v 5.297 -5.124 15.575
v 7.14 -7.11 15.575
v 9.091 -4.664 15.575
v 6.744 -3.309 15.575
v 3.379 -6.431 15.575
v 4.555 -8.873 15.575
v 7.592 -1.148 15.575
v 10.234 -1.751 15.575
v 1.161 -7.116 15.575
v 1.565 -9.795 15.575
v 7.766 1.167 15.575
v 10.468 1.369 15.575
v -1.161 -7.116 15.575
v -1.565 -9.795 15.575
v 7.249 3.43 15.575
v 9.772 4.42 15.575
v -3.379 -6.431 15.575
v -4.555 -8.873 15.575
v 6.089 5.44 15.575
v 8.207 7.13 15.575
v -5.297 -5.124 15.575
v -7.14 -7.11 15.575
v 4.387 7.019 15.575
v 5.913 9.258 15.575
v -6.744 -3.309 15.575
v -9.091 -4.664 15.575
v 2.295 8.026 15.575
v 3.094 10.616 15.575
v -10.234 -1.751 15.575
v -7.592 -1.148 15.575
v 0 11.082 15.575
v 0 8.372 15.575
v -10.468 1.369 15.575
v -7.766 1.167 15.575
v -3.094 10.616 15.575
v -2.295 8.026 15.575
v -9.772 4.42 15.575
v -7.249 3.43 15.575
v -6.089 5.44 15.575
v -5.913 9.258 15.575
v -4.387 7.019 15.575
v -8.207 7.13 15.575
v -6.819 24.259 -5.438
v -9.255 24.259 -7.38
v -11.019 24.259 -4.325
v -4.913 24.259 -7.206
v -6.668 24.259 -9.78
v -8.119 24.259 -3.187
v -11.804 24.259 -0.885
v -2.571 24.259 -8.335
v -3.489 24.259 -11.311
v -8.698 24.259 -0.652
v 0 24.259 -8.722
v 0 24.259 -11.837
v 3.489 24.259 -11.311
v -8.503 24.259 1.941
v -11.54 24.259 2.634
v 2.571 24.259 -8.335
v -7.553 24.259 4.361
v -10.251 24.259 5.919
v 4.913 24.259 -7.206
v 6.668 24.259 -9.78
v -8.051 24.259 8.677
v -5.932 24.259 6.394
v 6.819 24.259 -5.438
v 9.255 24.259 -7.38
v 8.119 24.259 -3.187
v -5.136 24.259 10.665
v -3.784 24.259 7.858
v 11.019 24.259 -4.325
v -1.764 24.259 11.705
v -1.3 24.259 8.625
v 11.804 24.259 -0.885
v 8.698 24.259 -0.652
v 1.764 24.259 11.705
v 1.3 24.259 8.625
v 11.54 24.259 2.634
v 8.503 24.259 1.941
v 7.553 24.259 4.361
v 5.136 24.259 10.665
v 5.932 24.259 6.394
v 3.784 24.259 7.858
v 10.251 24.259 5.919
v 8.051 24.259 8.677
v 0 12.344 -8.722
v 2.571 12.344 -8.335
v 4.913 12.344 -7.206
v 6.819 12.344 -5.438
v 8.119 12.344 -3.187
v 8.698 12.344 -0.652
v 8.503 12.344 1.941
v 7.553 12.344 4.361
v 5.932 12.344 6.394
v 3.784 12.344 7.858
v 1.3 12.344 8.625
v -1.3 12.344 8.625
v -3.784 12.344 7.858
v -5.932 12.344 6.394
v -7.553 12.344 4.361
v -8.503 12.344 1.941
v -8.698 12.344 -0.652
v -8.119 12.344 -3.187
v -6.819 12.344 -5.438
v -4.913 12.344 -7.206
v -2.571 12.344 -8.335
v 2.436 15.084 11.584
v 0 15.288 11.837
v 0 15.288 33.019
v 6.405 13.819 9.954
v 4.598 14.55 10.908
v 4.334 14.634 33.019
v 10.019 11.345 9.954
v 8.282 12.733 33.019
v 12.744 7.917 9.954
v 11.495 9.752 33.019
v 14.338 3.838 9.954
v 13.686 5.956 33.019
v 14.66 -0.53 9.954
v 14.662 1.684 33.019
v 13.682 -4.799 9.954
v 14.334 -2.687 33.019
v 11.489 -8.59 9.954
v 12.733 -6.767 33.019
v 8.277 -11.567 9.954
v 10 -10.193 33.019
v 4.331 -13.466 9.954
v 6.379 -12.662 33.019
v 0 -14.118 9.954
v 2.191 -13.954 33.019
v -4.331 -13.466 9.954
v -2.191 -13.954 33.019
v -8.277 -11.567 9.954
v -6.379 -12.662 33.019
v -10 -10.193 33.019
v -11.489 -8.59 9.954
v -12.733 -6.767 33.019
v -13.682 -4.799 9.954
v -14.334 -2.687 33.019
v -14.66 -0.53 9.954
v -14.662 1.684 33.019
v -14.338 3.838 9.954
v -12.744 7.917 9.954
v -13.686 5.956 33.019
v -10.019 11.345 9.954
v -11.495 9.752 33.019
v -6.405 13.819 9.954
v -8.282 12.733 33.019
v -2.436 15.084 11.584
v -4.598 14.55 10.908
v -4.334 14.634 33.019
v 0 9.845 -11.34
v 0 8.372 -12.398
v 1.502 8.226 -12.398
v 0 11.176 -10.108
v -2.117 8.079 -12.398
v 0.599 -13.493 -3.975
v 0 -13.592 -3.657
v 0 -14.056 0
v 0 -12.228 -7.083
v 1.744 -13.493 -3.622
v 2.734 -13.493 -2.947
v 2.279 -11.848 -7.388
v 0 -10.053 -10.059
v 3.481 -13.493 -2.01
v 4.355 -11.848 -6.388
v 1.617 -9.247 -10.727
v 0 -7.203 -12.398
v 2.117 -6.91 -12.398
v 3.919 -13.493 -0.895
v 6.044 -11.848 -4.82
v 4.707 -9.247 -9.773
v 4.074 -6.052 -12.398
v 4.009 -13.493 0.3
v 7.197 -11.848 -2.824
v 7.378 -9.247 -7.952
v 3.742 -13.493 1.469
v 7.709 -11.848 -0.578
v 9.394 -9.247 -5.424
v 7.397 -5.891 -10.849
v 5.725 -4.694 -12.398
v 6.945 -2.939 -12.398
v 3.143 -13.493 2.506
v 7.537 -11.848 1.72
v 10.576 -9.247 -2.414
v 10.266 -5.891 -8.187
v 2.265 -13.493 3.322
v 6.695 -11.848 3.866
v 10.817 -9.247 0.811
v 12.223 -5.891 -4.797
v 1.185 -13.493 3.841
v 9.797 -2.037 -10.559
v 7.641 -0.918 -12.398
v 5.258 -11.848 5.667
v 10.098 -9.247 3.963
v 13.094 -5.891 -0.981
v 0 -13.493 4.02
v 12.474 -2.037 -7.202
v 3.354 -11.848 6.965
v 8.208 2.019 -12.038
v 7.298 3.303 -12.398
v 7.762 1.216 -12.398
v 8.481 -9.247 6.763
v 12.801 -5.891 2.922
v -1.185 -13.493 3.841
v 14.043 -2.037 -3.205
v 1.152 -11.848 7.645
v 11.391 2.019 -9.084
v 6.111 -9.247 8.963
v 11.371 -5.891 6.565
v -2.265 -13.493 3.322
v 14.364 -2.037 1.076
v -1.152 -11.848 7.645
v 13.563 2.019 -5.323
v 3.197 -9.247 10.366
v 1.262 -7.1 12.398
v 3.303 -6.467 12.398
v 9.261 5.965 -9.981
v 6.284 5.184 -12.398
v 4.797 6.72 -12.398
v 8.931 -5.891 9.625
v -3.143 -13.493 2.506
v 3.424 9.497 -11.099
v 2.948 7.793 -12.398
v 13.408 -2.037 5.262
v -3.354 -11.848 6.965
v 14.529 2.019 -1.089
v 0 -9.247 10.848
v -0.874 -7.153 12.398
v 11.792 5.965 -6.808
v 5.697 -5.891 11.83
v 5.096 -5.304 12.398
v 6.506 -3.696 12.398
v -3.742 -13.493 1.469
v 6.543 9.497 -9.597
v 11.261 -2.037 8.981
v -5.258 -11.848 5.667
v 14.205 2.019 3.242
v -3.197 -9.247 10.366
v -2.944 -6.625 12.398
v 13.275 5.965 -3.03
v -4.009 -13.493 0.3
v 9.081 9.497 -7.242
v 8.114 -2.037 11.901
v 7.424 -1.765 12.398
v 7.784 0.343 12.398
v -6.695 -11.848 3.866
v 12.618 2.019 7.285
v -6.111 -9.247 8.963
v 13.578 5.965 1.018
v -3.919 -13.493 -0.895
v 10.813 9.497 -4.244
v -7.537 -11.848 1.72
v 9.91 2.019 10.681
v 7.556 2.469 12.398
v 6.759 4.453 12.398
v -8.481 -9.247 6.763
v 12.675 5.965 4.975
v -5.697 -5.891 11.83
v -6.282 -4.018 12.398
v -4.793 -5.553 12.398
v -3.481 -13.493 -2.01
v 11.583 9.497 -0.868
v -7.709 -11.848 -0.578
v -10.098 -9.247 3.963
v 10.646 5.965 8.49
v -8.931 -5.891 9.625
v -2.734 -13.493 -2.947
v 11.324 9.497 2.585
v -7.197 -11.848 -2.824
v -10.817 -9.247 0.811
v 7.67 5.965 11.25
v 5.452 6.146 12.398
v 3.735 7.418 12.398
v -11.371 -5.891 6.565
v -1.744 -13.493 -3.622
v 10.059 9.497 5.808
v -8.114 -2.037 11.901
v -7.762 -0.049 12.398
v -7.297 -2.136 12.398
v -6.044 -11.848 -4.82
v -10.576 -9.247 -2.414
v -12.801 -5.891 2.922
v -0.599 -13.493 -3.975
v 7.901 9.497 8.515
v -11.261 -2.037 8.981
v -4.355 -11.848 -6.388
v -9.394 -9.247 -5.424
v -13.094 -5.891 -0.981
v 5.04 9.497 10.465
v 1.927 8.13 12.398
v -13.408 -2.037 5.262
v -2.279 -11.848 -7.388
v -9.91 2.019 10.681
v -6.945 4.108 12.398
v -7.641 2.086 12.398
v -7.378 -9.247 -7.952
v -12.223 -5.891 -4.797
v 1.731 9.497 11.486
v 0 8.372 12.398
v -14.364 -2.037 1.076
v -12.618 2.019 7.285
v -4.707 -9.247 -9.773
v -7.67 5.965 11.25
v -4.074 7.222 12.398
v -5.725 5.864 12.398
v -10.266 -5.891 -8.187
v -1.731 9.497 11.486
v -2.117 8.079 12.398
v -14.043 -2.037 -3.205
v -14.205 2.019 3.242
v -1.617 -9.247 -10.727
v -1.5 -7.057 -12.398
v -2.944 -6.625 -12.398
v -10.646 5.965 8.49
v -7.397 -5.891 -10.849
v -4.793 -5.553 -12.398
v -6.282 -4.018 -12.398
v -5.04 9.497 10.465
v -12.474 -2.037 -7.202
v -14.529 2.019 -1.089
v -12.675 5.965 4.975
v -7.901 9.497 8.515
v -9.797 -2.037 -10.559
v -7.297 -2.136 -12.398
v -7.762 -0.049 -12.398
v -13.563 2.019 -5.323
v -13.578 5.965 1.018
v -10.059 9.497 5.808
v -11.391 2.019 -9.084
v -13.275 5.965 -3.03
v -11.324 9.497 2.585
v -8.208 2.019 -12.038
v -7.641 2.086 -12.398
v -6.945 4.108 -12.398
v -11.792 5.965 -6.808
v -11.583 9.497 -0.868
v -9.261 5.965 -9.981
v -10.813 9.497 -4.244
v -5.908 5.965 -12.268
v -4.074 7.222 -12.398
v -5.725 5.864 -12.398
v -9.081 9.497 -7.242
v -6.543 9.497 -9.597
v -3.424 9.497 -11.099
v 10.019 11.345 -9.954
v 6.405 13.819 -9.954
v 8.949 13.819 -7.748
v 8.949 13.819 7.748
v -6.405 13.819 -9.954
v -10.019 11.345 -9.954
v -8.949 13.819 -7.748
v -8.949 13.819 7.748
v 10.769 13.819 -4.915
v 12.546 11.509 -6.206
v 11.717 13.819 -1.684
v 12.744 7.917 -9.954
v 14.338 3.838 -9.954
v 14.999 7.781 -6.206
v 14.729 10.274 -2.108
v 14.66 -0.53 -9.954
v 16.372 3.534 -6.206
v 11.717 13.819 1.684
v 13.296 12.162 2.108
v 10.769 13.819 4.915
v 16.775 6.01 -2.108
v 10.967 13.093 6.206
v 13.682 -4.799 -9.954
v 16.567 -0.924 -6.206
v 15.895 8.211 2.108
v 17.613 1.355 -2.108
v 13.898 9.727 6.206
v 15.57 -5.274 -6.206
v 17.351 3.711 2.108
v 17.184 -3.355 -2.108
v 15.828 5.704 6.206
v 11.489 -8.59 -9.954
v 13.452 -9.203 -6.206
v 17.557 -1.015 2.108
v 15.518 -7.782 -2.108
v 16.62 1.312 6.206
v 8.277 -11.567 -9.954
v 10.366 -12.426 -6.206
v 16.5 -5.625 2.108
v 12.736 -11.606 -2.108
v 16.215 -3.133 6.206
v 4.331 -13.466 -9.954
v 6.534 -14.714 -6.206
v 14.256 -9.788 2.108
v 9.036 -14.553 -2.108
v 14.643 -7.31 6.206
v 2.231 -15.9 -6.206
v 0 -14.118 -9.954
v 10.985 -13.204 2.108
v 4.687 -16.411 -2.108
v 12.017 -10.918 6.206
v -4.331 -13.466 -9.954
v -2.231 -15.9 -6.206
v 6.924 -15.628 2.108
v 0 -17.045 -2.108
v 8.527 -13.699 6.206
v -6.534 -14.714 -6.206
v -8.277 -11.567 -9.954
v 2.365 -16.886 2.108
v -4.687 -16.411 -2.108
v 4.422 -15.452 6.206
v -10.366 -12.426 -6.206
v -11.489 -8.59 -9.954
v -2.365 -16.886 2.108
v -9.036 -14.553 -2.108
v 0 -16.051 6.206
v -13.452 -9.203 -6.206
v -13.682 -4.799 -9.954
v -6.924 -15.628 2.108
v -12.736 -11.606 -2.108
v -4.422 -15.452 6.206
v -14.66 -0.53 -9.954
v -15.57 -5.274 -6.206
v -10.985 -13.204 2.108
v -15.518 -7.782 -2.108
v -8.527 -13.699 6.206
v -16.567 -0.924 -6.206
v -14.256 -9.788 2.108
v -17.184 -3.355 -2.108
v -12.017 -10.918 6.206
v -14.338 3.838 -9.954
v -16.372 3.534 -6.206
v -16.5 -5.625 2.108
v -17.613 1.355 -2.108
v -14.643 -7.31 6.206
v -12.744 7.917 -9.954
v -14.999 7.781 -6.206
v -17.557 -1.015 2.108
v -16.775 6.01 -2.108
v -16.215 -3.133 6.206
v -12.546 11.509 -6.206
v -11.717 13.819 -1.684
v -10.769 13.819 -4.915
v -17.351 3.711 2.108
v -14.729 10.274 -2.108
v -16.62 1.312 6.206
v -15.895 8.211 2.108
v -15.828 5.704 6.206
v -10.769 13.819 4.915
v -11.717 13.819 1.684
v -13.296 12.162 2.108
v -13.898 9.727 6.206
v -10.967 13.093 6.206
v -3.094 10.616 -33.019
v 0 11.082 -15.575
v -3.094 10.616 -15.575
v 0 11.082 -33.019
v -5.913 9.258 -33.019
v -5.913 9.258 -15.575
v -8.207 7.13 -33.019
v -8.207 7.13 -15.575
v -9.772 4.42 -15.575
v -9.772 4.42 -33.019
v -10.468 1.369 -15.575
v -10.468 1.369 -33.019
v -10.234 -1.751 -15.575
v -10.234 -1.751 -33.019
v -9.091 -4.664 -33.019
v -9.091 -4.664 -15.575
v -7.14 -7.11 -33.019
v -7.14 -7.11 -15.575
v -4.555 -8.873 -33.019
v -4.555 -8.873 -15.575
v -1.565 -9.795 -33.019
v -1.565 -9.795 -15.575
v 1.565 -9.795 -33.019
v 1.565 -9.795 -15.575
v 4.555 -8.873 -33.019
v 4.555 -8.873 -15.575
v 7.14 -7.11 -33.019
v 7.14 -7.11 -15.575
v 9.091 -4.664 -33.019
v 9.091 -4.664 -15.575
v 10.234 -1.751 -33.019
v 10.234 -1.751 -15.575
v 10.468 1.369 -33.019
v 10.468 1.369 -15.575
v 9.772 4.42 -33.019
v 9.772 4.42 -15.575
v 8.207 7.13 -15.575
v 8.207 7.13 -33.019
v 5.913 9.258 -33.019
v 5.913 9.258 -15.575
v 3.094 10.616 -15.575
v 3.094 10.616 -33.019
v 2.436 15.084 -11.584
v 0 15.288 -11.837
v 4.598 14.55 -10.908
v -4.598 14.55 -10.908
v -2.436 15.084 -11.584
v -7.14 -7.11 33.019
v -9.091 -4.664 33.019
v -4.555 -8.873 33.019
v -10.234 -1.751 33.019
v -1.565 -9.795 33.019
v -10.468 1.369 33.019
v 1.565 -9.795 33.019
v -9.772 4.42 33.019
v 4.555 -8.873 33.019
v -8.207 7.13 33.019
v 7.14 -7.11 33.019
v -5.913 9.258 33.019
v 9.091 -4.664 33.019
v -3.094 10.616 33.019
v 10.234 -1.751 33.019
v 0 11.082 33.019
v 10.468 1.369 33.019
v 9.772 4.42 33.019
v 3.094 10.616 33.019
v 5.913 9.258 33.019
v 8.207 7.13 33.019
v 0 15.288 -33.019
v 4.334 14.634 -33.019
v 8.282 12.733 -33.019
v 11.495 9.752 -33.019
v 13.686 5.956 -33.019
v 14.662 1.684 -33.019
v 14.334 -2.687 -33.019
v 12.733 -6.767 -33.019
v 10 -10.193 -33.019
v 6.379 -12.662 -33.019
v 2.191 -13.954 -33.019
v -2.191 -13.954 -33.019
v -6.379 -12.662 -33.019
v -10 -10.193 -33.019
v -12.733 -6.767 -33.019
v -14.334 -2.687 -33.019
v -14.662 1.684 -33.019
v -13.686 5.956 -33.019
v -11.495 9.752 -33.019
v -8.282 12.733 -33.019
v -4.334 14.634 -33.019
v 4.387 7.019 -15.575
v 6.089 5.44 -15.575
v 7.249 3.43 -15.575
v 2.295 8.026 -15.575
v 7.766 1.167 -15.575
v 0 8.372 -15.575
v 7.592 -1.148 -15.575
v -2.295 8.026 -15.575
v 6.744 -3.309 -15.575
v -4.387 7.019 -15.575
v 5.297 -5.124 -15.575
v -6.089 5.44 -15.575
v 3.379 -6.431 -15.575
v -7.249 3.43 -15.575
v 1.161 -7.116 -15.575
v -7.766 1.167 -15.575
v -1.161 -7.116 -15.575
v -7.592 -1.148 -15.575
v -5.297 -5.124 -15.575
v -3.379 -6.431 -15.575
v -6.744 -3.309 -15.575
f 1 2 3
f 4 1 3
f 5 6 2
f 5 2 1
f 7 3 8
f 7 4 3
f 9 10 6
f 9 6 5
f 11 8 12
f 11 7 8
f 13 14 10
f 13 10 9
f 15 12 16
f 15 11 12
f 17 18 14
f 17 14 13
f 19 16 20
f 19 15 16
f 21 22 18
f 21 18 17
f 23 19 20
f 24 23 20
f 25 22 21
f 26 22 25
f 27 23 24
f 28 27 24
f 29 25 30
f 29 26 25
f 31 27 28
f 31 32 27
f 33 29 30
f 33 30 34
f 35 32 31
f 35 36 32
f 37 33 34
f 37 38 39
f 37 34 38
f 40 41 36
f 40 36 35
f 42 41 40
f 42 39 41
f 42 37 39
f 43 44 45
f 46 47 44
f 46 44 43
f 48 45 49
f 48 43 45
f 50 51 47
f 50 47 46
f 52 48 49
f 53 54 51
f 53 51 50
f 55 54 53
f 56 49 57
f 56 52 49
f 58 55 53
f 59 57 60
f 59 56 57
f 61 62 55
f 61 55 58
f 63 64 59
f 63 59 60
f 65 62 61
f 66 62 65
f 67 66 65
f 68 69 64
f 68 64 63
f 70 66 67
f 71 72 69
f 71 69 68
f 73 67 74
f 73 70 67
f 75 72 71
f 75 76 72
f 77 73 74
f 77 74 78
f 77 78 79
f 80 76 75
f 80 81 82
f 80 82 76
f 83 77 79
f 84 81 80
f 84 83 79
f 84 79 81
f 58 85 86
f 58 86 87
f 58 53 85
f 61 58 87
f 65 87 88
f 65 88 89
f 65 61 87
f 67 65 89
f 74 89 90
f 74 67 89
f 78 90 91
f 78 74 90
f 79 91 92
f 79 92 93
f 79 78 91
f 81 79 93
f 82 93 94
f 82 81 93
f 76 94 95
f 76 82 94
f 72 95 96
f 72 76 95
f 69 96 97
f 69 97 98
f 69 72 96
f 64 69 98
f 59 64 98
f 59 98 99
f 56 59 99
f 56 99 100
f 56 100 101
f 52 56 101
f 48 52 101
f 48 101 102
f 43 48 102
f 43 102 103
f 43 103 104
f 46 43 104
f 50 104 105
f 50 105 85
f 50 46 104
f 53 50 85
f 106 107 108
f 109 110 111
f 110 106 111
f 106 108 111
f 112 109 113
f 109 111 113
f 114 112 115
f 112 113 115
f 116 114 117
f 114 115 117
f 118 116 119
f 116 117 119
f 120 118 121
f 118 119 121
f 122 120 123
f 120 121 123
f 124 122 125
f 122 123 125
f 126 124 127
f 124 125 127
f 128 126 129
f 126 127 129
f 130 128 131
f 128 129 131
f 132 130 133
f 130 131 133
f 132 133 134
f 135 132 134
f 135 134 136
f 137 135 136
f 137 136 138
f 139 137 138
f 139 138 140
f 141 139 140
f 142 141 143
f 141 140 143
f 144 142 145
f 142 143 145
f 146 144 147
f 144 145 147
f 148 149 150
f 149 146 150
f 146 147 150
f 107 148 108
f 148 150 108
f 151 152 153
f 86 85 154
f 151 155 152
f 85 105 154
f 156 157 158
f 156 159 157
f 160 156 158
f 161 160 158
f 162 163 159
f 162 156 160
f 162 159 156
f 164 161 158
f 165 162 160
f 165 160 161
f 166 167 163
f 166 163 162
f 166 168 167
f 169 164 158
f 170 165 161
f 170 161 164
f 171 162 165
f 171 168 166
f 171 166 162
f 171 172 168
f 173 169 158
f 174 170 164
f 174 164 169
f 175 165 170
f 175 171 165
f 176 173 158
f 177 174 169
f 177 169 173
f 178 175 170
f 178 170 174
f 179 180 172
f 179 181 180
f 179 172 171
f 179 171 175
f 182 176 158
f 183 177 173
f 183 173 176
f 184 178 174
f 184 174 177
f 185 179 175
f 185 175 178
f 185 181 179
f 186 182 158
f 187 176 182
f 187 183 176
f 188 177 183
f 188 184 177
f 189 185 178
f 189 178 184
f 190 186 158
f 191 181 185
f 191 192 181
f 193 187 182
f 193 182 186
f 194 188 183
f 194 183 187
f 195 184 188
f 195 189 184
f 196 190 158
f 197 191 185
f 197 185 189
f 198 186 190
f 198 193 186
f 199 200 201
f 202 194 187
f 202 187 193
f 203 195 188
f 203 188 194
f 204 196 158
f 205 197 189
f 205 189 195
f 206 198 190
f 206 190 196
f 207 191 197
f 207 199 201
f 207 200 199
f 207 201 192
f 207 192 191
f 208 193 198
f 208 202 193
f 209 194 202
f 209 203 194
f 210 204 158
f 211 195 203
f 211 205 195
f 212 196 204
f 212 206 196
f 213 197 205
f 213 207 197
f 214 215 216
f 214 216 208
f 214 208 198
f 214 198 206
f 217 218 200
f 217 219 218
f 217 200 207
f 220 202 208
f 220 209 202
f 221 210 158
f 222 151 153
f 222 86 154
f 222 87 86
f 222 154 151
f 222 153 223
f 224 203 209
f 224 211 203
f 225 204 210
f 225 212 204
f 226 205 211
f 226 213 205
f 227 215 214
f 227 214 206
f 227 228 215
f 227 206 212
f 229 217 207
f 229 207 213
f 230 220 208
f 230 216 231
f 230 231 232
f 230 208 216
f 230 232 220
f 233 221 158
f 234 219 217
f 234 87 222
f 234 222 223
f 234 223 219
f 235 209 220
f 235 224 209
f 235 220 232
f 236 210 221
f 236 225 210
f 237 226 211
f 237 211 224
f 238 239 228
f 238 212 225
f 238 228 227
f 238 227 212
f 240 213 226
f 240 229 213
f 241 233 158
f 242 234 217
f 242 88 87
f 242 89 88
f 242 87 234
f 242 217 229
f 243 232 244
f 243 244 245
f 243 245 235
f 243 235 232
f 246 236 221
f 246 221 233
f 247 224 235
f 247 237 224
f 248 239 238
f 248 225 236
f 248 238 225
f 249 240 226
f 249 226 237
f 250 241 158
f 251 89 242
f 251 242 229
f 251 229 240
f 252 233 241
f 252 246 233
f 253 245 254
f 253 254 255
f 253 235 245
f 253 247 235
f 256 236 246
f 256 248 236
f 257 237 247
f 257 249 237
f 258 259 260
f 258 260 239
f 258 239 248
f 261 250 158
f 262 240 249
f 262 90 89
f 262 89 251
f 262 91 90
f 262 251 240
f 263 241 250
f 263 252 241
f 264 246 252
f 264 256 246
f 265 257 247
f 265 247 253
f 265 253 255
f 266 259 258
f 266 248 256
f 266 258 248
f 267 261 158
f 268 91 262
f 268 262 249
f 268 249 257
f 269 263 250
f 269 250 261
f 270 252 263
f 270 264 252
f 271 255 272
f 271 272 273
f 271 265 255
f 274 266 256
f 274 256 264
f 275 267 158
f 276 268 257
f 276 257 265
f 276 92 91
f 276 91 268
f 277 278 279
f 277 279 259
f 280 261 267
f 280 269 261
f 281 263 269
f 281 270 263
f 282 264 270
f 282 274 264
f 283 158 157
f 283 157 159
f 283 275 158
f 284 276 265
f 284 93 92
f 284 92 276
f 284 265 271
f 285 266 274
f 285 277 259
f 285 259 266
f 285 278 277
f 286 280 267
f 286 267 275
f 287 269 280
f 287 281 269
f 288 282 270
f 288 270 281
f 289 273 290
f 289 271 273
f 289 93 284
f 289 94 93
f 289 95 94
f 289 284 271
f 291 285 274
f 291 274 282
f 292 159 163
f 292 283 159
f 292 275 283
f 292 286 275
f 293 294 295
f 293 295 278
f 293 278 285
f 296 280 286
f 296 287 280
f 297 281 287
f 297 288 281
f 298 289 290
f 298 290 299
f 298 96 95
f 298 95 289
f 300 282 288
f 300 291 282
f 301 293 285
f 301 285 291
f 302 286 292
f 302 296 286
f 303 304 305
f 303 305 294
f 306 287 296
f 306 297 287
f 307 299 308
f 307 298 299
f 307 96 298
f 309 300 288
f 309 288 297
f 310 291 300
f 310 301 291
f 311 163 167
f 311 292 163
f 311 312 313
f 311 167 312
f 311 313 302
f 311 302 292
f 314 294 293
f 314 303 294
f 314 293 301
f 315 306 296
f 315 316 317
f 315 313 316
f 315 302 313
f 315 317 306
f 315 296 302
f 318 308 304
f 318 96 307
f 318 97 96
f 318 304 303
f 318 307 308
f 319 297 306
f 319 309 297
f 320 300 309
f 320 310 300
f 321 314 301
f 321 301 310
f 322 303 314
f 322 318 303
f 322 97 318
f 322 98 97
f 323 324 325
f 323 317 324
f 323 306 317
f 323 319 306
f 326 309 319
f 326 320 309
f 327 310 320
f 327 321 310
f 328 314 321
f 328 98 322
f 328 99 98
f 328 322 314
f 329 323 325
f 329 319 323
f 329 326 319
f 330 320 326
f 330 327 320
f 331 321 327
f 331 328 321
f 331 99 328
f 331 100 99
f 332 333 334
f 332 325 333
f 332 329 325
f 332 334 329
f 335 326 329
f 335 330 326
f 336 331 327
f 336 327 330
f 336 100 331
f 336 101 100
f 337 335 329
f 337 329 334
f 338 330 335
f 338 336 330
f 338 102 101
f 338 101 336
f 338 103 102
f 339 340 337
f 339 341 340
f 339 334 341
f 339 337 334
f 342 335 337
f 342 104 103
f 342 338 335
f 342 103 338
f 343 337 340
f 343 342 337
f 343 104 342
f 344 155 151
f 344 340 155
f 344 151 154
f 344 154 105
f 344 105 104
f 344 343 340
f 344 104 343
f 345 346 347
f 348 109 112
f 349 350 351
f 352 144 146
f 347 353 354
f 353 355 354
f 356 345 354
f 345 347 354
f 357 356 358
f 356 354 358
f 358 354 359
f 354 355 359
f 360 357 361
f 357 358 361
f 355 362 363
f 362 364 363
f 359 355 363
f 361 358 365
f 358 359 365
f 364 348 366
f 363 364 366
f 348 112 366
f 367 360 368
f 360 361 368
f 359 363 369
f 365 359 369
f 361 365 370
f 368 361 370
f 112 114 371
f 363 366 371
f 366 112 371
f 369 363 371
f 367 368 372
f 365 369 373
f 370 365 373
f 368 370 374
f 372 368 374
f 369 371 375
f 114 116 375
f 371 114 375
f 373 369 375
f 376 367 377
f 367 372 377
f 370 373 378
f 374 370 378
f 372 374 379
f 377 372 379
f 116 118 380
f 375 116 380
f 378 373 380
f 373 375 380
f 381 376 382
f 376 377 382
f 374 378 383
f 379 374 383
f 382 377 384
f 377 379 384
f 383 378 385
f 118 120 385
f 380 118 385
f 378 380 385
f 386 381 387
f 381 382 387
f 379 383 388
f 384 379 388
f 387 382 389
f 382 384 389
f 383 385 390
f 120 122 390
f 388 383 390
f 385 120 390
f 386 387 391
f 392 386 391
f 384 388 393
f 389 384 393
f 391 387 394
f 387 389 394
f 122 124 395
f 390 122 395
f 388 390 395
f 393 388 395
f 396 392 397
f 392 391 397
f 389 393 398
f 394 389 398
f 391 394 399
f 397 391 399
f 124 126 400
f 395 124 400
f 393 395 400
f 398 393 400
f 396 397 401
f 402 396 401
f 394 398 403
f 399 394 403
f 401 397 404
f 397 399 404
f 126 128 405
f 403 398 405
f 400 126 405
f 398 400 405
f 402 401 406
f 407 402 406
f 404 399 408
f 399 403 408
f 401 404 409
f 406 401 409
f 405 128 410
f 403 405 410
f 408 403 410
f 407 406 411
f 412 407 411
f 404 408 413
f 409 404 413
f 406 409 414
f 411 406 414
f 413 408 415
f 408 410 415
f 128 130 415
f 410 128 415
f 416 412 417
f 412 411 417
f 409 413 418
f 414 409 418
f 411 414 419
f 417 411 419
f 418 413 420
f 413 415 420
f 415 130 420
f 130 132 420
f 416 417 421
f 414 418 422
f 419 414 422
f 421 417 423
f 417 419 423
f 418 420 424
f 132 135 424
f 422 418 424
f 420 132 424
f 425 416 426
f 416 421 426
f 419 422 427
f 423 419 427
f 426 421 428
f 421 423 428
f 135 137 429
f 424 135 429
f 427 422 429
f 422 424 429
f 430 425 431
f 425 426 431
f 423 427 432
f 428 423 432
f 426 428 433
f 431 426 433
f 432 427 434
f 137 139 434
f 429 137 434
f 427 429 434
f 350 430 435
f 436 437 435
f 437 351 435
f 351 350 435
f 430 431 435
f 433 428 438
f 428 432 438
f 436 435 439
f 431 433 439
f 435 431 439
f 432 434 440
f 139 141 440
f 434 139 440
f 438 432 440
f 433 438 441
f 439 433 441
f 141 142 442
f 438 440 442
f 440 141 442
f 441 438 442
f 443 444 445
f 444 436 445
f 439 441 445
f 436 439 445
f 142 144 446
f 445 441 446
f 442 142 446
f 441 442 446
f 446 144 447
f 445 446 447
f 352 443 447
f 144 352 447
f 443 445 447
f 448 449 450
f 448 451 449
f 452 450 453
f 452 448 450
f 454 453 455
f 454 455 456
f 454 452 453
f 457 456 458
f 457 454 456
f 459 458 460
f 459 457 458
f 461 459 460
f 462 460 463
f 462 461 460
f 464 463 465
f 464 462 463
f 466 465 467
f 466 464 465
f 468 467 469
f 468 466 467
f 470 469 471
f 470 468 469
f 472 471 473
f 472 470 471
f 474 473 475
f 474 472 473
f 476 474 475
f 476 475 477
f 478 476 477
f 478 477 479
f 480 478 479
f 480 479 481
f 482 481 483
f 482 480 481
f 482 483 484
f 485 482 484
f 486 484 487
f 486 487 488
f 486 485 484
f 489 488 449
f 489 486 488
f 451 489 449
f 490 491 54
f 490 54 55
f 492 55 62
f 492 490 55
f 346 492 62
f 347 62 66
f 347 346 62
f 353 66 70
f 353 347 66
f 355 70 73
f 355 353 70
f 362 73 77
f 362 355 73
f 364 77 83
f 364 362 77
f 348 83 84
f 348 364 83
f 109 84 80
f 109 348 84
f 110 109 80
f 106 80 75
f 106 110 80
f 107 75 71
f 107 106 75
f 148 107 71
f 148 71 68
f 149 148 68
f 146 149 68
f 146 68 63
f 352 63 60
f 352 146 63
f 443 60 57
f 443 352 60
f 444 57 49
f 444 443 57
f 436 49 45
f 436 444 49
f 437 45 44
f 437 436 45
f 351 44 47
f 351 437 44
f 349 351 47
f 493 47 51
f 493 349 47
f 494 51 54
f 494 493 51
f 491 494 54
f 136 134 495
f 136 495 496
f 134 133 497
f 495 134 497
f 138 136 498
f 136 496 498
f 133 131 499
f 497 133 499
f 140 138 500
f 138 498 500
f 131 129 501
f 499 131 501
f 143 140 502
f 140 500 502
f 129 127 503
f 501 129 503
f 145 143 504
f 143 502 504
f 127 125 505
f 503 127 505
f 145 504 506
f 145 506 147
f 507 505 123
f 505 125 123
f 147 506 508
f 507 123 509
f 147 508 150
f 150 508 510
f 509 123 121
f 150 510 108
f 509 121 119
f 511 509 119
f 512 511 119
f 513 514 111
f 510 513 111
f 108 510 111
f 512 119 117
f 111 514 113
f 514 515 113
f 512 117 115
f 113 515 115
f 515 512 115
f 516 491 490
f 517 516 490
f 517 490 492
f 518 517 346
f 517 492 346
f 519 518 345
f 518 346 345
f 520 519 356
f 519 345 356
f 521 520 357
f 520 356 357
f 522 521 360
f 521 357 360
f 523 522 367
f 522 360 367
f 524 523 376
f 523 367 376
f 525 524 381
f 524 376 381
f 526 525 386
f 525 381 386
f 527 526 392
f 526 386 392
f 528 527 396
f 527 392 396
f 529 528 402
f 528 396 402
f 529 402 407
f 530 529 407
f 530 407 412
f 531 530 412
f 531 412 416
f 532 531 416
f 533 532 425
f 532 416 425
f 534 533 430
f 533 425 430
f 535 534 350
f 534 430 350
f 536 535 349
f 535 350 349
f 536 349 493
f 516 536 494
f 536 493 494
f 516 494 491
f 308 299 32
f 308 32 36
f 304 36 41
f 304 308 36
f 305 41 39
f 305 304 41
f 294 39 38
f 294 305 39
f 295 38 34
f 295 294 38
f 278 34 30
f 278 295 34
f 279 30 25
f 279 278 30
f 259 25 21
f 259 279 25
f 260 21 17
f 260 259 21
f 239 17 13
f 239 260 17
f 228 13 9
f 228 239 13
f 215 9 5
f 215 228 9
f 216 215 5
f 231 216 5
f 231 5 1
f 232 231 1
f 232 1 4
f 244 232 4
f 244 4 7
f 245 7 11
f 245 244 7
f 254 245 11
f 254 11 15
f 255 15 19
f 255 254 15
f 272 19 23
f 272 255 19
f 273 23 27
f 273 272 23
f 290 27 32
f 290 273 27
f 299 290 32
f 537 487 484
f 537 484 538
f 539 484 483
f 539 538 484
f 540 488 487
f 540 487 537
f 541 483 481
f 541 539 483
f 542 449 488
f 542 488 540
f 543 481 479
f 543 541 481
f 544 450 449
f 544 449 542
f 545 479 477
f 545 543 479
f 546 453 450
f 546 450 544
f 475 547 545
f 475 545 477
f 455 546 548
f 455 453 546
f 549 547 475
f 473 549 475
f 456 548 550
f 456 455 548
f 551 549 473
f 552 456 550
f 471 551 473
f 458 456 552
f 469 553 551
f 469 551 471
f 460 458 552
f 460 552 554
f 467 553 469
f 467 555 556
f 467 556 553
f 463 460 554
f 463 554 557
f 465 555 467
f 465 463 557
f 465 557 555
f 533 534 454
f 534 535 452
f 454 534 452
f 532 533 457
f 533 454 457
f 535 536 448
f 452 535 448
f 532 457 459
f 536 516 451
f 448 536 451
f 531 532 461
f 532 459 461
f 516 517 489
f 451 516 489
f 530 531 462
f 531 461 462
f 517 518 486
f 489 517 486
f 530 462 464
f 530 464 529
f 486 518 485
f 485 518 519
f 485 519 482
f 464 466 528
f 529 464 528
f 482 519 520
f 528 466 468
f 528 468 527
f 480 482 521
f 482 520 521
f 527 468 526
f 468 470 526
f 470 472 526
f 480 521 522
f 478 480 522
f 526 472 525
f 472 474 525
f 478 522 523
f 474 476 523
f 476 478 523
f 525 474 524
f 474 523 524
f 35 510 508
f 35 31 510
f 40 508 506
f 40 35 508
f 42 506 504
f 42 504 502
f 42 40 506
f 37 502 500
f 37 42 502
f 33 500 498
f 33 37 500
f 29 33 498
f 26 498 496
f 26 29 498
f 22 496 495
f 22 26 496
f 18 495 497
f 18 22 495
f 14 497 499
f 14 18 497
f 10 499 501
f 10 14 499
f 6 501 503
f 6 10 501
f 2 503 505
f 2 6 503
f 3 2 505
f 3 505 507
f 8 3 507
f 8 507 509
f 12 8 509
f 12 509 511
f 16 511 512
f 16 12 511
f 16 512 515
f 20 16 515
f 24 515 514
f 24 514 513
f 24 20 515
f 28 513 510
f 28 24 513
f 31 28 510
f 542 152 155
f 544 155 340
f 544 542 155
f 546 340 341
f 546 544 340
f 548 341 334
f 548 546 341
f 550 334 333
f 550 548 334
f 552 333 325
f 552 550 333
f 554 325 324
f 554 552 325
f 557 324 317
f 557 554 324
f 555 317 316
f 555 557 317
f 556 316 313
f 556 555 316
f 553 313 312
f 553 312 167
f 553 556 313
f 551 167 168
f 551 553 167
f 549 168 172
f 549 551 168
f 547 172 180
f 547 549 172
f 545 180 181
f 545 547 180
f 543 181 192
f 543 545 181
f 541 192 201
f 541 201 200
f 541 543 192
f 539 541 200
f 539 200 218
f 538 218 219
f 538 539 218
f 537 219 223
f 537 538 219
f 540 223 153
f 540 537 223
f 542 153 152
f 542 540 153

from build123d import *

# Parameters (mm, degrees)
SCALE1_SCALE = 0.623


with BuildPart() as part:
    # Sketch2 → RevolveBody (revolve)
    with BuildSketch(Plane(origin=(0, 0, 0), x_dir=(0, 0, -1), z_dir=(1, 0, 0))):
        with BuildLine():
            Line((53, 23.6), (15.977797095, 23.6))
            ThreePointArc((15.977797095, 23.6), (0, 28.5), (-15.977797095, 23.6))
            Line((-15.977797095, 23.6), (-53, 23.6))
            Line((-53, 23.6), (-53, 0))
            Line((-53, 0), (53, 0))
            Line((53, 0), (53, 23.6))
        make_face()
    revolve(axis=Axis((0, 0, 97.71293904), (0, 0, -1)))

    # Sketch3 → RevStem (revolve)
    with BuildSketch(Plane(origin=(0, 0, 0), x_dir=(0, 0, -1), z_dir=(1, 0, 0))):
        with BuildLine():
            Line((19, 38), (19, 21.242645786))
            ThreePointArc((19, 21.242645786), (10.169429559, 26.62391223), (0, 28.5))
            Line((0, 28.5), (0, 38))
            Line((0, 38), (19, 38))
        make_face()
    revolve(axis=Axis((0, 38, 0), (0, -1, 0)))

    # Sketch4 → CoreBody (revolve, cut)
    with BuildSketch(Plane(origin=(0, 0, 0), x_dir=(0, 0, -1), z_dir=(1, 0, 0))):
        Polygon((53, 16.85), (53, 0), (-53, 0), (-53, 16.85), (-25, 16.85), (-25, 12.5), (25, 12.5), (25, 16.85), align=None)
    revolve(axis=Axis((0, 0, -53), (0, 0, 1)), mode=Mode.SUBTRACT)

    # Sketch5 → CoreStem (revolve, cut)
    with BuildSketch(Plane(origin=(0, 0, 0), x_dir=(0, 0, -1), z_dir=(1, 0, 0))):
        with BuildLine():
            Line((14, 38), (0, 38))
            Line((0, 38), (0, -23.5))
            ThreePointArc((0, -23.5), (22.313704008, -7.37215121), (14, 18.874586088))
            Line((14, 18.874586088), (14, 38))
        make_face()
    revolve(axis=Axis((0, 58.20350065, 0), (0, -1, 0)), mode=Mode.SUBTRACT)


with BuildPart() as part_1:
    # Scale1: scaled about (-8.85e-07, 1.551247427, 4.25e-06)
    add(part.part.scale(SCALE1_SCALE).moved(Location((-3.34e-07, 0.58482028, 1.602e-06))))


solid = part_1.part
